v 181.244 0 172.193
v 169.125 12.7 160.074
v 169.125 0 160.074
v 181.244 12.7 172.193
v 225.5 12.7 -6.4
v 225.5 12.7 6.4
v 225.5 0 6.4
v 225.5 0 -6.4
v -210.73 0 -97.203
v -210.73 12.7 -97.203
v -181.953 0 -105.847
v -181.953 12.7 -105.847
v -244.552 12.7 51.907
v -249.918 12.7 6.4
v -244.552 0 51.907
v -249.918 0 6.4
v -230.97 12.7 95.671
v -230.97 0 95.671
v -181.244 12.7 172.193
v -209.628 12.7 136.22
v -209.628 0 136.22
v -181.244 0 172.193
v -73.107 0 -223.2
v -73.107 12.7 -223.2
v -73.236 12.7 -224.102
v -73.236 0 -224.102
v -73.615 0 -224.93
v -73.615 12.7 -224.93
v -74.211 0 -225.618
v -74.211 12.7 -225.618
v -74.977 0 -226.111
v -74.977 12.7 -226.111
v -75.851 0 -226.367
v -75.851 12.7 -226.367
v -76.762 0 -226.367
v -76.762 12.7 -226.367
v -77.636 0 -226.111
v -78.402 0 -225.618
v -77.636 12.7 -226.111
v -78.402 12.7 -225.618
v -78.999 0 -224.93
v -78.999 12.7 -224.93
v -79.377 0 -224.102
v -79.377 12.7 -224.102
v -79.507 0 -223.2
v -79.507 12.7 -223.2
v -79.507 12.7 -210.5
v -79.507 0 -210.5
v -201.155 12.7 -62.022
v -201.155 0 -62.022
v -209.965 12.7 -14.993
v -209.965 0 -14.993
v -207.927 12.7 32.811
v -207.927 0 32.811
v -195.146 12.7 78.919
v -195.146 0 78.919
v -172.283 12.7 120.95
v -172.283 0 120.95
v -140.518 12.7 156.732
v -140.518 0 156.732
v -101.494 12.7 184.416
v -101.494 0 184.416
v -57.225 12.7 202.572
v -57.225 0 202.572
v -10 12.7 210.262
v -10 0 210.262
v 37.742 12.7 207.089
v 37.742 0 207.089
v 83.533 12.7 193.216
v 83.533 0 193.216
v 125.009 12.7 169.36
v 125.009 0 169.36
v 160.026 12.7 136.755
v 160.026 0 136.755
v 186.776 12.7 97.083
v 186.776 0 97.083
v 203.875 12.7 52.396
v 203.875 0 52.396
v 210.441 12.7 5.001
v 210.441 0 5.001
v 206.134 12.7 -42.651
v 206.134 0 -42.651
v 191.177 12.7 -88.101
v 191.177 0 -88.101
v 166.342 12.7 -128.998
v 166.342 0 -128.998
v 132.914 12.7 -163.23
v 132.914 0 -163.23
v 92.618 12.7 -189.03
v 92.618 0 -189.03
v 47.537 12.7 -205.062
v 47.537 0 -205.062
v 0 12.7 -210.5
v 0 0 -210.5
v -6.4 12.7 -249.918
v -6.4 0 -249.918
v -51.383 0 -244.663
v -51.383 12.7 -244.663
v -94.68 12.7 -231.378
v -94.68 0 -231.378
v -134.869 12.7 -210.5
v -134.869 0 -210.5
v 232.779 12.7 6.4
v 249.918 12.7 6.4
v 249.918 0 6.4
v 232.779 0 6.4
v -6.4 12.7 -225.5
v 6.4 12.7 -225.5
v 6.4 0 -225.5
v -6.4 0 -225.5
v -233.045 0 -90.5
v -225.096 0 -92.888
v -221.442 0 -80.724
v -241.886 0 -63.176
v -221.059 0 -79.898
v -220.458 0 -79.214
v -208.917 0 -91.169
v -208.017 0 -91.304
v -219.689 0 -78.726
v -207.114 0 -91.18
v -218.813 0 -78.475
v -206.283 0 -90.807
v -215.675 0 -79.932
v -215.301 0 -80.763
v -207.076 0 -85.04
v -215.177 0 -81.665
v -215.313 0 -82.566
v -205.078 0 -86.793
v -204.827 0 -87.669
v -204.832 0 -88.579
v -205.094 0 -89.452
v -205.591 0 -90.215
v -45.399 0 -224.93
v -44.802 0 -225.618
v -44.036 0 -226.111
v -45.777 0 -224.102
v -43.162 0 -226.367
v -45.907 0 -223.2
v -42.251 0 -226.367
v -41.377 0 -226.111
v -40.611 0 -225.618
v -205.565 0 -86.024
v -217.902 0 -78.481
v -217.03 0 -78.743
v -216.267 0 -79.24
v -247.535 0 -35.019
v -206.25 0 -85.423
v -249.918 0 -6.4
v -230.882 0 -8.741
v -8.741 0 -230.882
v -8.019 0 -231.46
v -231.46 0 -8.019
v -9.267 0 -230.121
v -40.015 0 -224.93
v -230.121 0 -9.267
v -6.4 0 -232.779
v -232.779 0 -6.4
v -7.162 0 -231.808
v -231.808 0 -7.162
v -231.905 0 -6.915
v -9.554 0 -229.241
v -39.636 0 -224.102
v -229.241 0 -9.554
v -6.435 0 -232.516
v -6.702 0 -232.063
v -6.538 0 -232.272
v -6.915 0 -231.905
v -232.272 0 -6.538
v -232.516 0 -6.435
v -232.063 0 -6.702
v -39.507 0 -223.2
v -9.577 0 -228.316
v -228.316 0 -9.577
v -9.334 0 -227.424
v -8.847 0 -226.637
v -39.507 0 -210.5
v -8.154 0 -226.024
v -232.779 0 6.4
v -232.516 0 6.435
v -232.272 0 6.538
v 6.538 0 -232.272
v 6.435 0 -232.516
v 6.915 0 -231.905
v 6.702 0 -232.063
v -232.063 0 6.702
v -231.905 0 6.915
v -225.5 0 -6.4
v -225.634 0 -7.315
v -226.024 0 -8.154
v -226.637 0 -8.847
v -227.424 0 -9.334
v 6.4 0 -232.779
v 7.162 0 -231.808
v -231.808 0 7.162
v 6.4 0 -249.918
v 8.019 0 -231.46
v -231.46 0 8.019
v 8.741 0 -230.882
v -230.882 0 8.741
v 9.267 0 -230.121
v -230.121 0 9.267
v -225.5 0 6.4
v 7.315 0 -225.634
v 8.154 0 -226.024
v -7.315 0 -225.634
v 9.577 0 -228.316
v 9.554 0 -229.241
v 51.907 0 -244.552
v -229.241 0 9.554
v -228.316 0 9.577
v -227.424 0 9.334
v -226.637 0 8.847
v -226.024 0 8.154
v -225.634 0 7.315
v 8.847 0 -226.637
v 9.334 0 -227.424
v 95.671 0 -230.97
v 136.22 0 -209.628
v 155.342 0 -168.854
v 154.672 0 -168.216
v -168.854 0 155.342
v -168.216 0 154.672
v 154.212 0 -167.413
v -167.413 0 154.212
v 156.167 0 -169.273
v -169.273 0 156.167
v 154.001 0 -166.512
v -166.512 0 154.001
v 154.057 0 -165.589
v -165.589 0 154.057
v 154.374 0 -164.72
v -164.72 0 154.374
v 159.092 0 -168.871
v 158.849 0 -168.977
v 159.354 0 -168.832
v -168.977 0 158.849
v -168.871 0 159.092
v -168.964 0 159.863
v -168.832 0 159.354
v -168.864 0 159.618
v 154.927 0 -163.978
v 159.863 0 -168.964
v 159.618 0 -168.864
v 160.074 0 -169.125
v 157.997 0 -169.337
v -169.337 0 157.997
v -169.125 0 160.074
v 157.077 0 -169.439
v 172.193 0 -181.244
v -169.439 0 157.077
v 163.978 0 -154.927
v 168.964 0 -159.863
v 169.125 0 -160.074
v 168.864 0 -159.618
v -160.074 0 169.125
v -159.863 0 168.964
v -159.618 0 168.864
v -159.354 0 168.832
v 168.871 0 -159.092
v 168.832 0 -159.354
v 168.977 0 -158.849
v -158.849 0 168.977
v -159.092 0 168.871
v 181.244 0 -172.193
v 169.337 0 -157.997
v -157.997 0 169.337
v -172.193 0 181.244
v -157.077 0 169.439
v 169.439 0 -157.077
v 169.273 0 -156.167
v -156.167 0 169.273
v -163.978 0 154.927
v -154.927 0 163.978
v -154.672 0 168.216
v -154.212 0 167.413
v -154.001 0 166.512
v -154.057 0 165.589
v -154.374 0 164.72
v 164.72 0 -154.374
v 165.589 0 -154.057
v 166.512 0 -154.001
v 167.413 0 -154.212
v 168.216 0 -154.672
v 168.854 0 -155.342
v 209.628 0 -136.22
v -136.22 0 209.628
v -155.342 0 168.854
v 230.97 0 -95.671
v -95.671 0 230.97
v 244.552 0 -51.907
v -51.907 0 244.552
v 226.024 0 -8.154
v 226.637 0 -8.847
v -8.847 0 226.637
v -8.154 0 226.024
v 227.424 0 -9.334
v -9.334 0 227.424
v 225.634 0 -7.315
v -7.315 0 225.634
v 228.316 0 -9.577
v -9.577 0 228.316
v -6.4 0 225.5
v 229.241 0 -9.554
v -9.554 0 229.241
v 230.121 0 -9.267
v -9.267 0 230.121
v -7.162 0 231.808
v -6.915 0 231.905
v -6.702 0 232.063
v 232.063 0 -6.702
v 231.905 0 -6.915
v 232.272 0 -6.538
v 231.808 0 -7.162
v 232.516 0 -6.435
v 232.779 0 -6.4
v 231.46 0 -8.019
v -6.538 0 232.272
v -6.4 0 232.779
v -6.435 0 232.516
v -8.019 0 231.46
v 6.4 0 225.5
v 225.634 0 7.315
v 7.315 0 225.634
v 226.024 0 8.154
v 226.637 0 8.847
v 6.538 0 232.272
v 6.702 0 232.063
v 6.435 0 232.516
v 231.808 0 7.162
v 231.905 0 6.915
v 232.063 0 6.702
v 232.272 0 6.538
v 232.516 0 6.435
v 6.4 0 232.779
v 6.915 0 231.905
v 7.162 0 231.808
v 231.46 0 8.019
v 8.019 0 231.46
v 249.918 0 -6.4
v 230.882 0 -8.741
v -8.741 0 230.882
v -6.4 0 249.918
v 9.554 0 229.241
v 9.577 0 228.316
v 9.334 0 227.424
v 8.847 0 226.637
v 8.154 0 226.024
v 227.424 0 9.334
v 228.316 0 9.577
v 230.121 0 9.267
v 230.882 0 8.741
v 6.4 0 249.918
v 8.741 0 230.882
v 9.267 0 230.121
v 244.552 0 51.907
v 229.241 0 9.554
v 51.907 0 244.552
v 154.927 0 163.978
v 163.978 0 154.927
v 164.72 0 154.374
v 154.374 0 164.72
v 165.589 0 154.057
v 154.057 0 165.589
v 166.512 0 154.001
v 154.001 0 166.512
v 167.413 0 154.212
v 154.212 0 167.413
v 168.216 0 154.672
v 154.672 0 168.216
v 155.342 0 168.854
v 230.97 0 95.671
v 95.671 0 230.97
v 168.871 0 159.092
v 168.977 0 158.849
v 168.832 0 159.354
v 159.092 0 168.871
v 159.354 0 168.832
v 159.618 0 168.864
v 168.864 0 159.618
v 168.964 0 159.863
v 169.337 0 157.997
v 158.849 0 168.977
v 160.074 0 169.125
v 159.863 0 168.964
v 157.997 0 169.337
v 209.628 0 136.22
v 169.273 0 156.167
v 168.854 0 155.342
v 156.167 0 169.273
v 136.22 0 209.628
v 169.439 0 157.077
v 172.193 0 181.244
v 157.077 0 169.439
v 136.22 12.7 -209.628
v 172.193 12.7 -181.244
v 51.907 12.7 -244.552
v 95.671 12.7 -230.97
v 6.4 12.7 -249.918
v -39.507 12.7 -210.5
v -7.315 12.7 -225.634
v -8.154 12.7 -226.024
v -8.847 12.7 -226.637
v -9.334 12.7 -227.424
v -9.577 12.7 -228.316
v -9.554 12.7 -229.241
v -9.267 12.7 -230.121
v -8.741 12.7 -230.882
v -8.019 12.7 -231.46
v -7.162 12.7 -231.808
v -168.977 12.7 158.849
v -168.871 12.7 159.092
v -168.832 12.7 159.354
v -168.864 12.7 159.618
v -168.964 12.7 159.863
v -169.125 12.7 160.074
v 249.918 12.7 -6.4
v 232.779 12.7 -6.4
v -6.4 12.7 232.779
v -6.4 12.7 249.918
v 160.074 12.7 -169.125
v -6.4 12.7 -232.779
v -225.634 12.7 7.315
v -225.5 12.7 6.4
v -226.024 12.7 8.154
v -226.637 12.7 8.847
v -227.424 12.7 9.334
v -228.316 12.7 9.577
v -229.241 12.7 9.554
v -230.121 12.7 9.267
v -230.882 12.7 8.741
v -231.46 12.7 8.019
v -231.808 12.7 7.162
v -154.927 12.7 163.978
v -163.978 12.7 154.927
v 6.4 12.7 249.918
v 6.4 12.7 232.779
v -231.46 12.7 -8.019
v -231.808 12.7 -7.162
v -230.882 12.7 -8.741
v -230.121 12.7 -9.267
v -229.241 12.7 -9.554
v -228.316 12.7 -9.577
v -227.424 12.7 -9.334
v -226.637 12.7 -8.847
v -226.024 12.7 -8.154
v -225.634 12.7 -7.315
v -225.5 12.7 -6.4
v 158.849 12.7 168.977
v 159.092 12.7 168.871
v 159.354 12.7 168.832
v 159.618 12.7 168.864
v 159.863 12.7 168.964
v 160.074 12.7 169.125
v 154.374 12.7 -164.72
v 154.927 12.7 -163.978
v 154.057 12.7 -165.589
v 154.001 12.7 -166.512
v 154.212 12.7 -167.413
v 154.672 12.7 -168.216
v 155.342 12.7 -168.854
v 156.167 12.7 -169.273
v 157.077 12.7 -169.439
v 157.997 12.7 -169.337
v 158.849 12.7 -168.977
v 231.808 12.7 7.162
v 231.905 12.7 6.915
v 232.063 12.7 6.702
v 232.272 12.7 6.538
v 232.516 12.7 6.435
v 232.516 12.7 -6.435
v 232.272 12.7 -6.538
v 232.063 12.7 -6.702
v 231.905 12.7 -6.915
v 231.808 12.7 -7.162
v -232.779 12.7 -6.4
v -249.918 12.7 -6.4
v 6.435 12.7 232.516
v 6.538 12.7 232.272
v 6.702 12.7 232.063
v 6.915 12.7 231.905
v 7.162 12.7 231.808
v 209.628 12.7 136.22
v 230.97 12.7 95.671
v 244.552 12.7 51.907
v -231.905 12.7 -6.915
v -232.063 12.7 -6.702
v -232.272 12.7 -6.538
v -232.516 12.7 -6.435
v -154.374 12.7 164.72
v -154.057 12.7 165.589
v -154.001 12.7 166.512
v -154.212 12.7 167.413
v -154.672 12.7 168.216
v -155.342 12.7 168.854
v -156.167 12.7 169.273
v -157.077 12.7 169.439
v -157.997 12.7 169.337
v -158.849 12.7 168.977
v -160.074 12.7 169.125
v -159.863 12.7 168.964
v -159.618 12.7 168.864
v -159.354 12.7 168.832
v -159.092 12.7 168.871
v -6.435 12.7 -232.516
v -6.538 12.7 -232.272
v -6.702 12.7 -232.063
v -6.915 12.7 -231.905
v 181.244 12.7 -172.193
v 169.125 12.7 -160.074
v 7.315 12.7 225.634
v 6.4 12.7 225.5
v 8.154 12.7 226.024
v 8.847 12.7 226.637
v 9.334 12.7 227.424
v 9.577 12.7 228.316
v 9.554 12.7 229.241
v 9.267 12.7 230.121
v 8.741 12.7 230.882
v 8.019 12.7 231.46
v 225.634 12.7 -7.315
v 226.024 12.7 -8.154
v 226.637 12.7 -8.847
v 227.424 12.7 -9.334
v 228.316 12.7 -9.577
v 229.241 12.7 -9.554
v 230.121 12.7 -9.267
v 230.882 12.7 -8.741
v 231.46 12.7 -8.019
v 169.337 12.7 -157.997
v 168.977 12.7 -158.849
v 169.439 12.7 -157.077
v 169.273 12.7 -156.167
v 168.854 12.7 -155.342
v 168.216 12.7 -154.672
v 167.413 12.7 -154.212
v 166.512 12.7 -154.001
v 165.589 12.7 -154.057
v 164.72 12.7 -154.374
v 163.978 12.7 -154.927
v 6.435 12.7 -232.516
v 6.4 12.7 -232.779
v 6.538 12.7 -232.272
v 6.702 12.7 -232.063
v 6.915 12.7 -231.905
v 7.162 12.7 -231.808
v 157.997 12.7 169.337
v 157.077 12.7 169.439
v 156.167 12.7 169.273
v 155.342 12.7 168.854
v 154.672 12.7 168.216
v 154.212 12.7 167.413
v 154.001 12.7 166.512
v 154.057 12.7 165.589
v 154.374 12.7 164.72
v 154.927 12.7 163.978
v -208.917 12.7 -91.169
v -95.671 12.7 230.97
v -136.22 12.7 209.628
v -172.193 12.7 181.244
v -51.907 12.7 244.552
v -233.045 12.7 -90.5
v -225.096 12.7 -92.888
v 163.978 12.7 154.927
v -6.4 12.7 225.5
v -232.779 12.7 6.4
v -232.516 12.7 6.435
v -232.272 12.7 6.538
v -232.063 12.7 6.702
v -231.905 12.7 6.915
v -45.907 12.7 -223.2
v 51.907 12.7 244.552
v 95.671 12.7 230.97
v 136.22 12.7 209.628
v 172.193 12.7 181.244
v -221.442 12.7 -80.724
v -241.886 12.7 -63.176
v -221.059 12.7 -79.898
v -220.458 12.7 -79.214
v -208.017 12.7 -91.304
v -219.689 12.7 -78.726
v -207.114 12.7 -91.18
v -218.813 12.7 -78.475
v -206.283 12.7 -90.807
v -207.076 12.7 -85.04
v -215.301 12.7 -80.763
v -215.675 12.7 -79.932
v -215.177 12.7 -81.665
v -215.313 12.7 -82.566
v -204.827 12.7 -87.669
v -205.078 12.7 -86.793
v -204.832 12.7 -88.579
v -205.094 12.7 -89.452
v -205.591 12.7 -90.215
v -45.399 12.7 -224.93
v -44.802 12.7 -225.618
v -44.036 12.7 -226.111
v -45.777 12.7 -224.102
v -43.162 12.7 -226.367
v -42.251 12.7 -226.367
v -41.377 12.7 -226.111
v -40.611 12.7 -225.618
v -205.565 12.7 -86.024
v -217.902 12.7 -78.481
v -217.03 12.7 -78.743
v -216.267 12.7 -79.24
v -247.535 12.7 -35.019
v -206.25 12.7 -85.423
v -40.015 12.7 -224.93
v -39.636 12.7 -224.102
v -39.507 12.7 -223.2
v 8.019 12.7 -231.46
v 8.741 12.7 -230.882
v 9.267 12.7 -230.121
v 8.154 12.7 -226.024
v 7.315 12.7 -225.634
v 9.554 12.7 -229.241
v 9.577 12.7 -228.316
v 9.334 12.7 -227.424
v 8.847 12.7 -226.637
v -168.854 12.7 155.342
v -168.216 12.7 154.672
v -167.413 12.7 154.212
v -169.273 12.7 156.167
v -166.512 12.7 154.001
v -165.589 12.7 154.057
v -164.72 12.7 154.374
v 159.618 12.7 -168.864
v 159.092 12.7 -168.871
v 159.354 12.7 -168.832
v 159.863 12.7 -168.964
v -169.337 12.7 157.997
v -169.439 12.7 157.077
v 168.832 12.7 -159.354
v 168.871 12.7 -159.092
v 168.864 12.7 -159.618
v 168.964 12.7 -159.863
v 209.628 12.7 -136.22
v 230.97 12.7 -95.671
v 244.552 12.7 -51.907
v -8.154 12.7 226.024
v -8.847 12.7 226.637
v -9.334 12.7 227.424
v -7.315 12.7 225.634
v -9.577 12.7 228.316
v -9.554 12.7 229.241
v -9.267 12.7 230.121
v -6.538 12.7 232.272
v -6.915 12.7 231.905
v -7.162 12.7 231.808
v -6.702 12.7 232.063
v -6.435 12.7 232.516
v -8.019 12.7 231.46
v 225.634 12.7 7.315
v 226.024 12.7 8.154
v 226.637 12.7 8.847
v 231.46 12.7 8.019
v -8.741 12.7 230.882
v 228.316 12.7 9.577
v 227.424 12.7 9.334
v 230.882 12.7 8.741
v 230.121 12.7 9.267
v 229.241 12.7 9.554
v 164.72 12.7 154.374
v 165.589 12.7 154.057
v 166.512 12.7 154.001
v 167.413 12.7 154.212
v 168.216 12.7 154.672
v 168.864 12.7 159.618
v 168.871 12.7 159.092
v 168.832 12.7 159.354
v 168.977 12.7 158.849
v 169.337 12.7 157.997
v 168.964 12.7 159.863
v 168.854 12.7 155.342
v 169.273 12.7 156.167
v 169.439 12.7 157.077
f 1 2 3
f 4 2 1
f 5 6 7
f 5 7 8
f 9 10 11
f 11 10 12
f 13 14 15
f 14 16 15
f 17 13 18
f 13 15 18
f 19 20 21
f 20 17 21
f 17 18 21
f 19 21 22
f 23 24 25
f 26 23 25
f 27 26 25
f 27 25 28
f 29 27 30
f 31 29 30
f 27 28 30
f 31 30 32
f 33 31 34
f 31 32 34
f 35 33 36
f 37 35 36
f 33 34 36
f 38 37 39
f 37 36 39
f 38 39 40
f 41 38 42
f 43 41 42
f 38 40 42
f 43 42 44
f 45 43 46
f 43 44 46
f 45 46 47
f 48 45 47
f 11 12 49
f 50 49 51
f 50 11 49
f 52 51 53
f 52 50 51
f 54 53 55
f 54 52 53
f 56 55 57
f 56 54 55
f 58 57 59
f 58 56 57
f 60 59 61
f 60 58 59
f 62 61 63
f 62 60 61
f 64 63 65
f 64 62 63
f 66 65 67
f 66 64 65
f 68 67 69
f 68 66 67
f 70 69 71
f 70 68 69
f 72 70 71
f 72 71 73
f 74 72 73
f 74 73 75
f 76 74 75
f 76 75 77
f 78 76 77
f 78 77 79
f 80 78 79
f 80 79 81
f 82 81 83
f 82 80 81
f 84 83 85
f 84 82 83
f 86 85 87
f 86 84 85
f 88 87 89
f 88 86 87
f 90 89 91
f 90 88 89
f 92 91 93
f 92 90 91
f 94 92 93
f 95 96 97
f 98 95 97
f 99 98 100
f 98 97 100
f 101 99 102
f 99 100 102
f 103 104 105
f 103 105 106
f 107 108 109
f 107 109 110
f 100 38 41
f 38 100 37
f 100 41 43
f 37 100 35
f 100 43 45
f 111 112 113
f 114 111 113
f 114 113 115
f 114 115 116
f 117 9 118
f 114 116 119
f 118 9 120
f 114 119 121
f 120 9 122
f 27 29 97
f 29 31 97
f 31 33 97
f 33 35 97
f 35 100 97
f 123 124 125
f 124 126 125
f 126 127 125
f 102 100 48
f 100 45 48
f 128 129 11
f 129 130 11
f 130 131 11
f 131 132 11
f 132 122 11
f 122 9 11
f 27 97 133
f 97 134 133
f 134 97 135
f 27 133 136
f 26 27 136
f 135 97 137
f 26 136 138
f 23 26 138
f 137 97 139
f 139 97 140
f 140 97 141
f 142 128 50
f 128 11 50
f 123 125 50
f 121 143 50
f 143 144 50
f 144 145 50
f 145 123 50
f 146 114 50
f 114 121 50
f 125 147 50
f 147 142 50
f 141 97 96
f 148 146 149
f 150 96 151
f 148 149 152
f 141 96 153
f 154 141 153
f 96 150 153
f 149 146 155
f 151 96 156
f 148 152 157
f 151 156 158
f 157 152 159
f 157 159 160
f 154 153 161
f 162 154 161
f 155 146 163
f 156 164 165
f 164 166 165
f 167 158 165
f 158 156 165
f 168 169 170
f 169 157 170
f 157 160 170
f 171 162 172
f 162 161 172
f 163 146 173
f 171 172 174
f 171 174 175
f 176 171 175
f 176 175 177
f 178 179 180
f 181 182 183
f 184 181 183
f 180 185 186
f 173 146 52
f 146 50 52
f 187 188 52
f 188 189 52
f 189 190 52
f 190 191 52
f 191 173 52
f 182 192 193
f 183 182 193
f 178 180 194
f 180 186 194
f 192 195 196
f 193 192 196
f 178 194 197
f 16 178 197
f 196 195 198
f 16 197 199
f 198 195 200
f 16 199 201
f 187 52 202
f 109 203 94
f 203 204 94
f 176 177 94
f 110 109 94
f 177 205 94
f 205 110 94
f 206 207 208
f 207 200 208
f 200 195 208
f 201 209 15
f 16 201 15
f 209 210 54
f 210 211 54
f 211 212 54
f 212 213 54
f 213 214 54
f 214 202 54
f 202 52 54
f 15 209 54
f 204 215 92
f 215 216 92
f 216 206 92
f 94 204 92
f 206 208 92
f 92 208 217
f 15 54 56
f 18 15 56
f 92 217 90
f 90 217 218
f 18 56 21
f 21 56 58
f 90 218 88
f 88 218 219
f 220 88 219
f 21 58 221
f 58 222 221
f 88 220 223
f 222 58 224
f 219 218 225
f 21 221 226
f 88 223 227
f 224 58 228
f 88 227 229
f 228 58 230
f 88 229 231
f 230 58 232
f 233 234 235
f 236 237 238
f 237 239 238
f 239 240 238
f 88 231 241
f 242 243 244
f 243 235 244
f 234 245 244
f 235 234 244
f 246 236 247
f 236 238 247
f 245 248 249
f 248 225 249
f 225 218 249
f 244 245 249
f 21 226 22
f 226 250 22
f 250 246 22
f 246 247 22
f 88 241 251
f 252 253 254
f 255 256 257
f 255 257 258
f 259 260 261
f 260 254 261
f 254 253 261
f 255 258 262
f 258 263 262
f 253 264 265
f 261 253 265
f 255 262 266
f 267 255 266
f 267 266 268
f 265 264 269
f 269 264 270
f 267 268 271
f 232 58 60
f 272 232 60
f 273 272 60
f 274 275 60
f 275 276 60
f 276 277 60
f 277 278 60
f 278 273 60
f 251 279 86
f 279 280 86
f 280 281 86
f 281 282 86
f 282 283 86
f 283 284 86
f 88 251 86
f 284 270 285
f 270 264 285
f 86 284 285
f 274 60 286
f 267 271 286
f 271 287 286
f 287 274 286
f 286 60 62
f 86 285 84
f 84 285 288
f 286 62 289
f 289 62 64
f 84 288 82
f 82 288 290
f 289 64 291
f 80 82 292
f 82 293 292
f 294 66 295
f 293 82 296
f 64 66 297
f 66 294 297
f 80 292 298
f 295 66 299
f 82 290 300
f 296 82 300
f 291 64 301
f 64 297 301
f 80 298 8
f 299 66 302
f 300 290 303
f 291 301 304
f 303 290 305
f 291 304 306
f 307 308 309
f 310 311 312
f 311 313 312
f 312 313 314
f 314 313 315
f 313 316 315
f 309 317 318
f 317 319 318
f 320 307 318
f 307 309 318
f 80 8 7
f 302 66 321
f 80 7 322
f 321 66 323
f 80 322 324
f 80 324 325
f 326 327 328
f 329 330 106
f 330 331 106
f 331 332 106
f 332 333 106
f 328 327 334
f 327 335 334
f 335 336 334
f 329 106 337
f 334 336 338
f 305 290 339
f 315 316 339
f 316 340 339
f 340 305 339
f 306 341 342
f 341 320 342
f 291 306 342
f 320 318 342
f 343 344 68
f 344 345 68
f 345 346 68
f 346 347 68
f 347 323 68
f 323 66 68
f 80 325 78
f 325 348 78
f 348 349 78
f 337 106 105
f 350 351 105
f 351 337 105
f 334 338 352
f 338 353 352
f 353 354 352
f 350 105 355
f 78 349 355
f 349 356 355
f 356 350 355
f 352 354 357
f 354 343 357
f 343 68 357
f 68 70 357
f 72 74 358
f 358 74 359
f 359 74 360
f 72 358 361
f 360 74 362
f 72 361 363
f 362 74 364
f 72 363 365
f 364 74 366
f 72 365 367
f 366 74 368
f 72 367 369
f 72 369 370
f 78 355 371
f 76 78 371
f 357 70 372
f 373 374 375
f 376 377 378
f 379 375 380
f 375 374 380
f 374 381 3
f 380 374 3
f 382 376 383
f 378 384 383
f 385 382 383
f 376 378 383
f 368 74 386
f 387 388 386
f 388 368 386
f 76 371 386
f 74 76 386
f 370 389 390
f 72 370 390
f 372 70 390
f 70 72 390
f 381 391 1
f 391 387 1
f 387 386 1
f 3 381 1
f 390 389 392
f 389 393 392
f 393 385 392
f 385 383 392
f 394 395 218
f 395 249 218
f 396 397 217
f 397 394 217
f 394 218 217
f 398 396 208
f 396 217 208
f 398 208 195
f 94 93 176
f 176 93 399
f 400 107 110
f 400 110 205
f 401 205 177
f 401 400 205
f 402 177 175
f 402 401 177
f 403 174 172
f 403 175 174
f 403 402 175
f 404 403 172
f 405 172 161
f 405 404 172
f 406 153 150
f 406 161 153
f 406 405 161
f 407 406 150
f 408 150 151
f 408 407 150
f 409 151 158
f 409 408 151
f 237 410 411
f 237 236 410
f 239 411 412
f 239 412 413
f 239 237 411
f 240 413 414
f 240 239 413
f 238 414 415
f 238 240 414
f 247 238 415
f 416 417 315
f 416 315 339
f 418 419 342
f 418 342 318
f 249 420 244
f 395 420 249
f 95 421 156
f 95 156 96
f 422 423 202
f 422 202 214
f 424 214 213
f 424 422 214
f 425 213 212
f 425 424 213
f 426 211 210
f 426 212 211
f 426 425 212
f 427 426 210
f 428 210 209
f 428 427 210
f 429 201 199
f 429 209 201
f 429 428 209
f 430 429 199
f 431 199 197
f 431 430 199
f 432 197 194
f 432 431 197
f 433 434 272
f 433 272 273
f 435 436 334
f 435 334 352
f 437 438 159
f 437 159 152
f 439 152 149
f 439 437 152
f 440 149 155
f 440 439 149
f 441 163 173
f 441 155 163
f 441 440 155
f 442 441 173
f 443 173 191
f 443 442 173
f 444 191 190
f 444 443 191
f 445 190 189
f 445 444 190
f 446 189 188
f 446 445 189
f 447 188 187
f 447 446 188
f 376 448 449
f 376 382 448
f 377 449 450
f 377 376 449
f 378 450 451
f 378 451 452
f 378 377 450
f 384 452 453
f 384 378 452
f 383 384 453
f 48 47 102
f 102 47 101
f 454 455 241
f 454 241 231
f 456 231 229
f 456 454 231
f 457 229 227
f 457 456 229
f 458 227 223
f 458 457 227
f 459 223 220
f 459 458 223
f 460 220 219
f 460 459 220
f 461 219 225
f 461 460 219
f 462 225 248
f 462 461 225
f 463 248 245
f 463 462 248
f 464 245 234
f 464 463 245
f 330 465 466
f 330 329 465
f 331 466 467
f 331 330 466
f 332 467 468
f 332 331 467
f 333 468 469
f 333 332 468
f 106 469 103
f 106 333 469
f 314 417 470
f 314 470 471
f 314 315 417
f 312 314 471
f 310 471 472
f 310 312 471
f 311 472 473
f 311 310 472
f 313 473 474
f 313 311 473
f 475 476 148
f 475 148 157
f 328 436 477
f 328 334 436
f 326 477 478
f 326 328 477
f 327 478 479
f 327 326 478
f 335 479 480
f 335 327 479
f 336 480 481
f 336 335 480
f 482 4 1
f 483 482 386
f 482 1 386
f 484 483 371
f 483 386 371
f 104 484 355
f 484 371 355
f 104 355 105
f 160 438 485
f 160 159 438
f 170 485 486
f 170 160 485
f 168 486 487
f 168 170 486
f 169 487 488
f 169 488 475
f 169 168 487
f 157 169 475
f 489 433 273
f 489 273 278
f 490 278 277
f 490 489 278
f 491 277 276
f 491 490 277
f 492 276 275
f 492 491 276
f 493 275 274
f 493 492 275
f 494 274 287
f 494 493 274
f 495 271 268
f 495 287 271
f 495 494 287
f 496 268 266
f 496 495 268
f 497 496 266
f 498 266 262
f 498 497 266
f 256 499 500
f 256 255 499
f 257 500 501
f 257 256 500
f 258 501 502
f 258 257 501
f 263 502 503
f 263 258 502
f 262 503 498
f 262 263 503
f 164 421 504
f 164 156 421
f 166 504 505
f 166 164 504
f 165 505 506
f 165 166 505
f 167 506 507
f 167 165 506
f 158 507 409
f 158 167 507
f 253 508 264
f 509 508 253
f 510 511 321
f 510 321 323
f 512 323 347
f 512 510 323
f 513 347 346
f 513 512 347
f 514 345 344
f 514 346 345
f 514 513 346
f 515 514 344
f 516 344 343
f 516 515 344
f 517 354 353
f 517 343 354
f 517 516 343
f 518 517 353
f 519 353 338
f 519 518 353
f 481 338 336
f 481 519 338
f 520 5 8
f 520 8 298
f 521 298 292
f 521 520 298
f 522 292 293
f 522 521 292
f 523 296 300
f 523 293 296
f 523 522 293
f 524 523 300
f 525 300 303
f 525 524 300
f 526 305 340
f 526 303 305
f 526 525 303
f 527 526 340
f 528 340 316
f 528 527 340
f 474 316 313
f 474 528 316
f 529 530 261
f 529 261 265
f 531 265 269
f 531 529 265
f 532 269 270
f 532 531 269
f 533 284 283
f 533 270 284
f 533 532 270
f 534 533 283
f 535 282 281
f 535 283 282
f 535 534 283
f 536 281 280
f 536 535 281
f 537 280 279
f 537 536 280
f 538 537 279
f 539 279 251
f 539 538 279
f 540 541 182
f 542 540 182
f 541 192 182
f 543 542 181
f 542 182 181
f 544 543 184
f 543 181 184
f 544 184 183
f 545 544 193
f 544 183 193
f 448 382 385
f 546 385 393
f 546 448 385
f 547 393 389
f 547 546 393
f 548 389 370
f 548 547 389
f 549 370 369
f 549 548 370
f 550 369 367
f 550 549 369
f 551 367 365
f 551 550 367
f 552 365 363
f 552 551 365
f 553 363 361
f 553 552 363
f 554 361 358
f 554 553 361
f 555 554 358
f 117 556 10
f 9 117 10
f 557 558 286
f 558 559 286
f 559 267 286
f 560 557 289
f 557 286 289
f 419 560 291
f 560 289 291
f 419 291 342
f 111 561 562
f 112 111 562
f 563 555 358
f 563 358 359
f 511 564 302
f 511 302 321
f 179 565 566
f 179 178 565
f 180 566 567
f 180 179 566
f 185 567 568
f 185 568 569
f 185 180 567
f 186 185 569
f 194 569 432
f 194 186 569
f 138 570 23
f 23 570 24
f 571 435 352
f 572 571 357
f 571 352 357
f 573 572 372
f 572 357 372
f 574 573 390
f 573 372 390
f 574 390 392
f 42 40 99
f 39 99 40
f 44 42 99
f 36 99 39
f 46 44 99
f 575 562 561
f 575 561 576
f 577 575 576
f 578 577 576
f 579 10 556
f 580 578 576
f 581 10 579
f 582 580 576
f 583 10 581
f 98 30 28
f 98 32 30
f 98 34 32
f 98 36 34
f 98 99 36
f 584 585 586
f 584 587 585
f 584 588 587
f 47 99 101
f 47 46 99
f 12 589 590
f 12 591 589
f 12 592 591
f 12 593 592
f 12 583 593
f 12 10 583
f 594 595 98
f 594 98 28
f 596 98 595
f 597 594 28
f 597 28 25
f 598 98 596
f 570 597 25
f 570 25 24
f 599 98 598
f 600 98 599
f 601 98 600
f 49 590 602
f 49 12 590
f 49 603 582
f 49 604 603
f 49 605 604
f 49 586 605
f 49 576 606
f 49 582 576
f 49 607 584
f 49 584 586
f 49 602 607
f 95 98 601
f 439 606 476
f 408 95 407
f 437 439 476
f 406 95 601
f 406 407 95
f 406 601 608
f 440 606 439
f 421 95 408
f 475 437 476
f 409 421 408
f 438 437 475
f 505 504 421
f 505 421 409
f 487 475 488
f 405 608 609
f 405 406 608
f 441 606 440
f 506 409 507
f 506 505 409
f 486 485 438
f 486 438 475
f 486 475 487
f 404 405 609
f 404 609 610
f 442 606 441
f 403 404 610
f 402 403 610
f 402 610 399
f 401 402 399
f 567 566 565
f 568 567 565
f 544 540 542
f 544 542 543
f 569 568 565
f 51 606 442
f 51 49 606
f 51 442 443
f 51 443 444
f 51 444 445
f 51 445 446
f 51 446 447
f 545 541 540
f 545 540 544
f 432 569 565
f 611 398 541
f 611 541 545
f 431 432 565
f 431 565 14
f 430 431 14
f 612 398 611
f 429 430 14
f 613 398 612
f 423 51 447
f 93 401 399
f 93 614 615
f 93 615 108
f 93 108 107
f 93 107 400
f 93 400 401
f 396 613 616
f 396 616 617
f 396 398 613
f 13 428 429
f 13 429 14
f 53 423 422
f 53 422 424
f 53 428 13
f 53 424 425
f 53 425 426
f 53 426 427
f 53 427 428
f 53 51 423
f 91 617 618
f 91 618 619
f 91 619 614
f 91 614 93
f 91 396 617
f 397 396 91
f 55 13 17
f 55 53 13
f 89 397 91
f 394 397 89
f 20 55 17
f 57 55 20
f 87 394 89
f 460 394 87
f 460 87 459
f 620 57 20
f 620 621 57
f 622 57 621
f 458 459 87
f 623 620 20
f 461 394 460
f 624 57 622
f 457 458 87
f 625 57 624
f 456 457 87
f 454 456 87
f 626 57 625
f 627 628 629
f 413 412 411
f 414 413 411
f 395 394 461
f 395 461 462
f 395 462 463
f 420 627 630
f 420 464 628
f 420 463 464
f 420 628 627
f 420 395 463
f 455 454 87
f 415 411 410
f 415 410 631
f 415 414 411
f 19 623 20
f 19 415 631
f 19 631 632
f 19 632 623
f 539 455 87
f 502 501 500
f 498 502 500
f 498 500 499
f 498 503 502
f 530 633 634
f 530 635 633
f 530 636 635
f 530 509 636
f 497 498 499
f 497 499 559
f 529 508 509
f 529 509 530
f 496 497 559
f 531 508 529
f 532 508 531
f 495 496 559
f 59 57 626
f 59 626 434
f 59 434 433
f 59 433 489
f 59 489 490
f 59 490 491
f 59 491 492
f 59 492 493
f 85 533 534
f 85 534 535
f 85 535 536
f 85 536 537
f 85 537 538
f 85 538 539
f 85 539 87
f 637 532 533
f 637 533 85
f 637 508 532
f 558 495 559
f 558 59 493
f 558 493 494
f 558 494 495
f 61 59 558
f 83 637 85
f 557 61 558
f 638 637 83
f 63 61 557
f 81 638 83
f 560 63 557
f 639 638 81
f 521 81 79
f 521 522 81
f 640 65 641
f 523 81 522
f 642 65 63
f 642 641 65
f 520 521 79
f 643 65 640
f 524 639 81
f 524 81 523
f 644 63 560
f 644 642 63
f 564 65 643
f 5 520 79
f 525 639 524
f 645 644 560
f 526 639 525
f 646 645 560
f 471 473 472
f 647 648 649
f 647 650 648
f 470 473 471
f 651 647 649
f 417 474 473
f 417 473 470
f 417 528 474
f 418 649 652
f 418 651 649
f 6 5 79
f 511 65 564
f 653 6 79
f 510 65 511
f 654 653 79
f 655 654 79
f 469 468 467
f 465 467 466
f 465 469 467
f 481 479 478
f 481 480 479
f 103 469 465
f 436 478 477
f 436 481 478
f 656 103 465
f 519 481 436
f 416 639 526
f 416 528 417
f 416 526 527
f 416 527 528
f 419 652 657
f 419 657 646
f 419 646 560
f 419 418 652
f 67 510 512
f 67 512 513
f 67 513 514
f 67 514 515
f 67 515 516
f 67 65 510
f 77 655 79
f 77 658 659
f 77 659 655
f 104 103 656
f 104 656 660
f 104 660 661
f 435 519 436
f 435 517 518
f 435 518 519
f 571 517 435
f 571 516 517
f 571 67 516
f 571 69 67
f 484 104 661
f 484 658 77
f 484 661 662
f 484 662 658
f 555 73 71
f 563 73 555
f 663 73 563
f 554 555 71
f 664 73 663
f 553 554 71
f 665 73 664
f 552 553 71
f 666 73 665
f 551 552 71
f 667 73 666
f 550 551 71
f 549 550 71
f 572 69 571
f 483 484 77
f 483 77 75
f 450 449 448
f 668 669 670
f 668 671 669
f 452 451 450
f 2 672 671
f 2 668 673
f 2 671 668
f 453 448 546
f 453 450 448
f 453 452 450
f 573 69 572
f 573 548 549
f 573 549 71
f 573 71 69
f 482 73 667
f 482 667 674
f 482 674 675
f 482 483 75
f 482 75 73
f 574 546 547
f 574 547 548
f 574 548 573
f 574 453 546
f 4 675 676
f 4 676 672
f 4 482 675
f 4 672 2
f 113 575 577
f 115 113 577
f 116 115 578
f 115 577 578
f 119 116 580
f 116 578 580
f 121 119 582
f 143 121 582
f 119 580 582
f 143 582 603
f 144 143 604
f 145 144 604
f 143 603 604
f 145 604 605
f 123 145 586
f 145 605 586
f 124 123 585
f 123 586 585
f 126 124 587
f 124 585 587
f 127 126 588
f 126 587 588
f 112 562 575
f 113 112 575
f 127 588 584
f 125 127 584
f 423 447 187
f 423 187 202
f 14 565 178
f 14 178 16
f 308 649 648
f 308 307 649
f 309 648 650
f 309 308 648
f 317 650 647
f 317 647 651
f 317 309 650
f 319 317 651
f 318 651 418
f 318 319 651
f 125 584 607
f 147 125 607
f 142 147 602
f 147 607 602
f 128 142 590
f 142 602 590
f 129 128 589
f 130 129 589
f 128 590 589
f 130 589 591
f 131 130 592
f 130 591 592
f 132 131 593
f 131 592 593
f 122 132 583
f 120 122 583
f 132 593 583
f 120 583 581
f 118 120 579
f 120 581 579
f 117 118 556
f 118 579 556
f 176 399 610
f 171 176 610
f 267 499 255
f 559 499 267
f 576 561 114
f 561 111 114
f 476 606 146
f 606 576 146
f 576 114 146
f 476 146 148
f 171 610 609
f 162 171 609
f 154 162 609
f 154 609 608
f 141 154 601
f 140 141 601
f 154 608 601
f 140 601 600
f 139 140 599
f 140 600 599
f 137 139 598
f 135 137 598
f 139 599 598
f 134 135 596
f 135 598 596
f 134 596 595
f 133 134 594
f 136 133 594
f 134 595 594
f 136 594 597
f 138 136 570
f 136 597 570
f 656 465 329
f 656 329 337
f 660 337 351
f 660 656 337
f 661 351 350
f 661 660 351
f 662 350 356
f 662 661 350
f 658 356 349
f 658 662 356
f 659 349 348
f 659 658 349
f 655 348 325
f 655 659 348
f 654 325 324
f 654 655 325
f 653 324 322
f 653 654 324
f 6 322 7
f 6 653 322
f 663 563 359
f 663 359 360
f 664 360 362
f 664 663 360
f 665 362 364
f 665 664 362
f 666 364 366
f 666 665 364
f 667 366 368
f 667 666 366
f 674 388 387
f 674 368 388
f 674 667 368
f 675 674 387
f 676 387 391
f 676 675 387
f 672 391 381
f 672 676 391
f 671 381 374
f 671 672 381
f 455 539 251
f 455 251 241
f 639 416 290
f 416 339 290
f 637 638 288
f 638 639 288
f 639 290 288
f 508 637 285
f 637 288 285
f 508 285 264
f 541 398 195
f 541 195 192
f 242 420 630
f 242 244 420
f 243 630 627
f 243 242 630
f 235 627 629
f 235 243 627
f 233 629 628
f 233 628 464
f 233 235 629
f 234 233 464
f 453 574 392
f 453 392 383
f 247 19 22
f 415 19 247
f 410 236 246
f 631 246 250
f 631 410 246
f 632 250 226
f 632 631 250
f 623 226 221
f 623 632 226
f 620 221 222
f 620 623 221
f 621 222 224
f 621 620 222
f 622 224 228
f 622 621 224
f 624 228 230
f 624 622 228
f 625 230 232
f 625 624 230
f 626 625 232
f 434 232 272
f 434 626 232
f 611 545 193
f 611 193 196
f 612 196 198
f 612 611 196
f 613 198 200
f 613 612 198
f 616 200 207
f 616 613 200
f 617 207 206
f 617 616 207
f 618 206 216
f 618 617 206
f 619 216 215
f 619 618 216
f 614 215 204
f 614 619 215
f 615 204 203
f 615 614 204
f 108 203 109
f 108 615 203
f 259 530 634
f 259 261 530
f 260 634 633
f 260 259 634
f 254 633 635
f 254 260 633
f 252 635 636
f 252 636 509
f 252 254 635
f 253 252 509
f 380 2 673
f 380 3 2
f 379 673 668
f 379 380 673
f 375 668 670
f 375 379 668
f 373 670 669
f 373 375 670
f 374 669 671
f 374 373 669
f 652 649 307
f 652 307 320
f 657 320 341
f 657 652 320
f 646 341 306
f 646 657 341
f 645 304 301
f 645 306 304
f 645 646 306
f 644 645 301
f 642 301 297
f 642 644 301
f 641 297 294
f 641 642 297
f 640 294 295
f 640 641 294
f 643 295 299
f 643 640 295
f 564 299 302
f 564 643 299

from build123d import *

# Parameters (mm, degrees)
SKETCH1_R                = 250
SKETCH1_R_2              = 210.5
BOSS_EXTRUDE1_DEPTH      = 12.7
CUT_EXTRUDE1_DEPTH       = 354.781415566
FILLET1_R                = 1
CIRPATTERN1_COUNT        = 8
FILLET1_OF_CIRPATTERN1_R = 1
CUT_EXTRUDE3_DEPTH       = 354.665618911
CUT_EXTRUDE4_DEPTH       = 354.665618911


with BuildPart() as part:
    # Sketch1 → Boss-Extrude1 (new body)
    with BuildSketch(Plane(origin=(0, 0, 0), x_dir=(1, 0, 0), z_dir=(0, 1, 0))):
        with Locations(Location((0, 0, 0), (0, 0, 270))):
            Circle(SKETCH1_R)
        with Locations(Location((0, 0, 0), (0, 0, 270))):
            Circle(SKETCH1_R_2, mode=Mode.SUBTRACT)
    extrude(amount=BOSS_EXTRUDE1_DEPTH)

    # Sketch2 → Cut-Extrude1 (cut, through all)
    with BuildSketch(Plane(origin=(0, 12.7, 0), x_dir=(1, 0, 0), z_dir=(0, 1, 0))):
        with BuildLine():
            Line((6.4, 225.5), (-6.4, 225.5))
            ThreePointArc((-6.4, 225.5), (-9.6, 228.7), (-6.4, 231.9))
            Line((-6.4, 231.9), (-6.4, 250))
            Line((-6.4, 250), (6.4, 250))
            Line((6.4, 250), (6.4, 231.9))
            ThreePointArc((6.4, 231.9), (9.6, 228.7), (6.4, 225.5))
        make_face()
    cut_extrude1 = extrude(amount=-CUT_EXTRUDE1_DEPTH, mode=Mode.SUBTRACT)

    # Fillet1
    fillet1_edges = [part.edges().sort_by_distance(p)[0] for p in [
        (-6.4, 6.35, -231.9),
        (6.4, 6.35, -231.9),
    ]]
    fillet(fillet1_edges, radius=FILLET1_R)

    # CirPattern1: Cut-Extrude1 ×8 about axis
    cirpattern1_axis = Axis((0, 0, 0), (0, 1, 0))
    for i in range(1, CIRPATTERN1_COUNT):
        add(cut_extrude1.rotate(cirpattern1_axis, i * 360 / CIRPATTERN1_COUNT), mode=Mode.SUBTRACT)

    # Fillet1 of CirPattern1
    fillet1_of_cirpattern1_edges = [part.edges().sort_by_distance(p)[0] for p in [
        (-168.503545957, 6.35, -159.452579158),
        (-159.452579158, 6.35, -168.503545957),
        (-231.9, 6.35, 6.4),
        (-231.9, 6.35, -6.4),
        (-159.452579158, 6.35, 168.503545957),
        (-168.503545957, 6.35, 159.452579158),
        (6.4, 6.35, 231.9),
        (-6.4, 6.35, 231.9),
        (168.503545957, 6.35, 159.452579158),
        (159.452579158, 6.35, 168.503545957),
        (231.9, 6.35, -6.4),
        (231.9, 6.35, 6.4),
        (159.452579158, 6.35, -168.503545957),
        (168.503545957, 6.35, -159.452579158),
    ]]
    fillet(fillet1_of_cirpattern1_edges, radius=FILLET1_OF_CIRPATTERN1_R)

    # Sketch5 → Cut-Extrude3 (cut, through all)
    with BuildSketch(Plane(origin=(0, 12.7, 0), x_dir=(1, 0, 0), z_dir=(0, 1, 0))):
        Polygon((0, 210.5), (-248.044523643, 210.5), (-248.044523643, 90.5), (-233.044523643, 90.5), (0, 160.5), align=None)
    extrude(amount=-CUT_EXTRUDE3_DEPTH, mode=Mode.SUBTRACT)

    # Sketch6 → Cut-Extrude4 (cut, through all)
    with BuildSketch(Plane(origin=(0, 12.7, 0), x_dir=(1, 0, 0), z_dir=(0, 1, 0))):
        with BuildLine():
            Line((-39.506660352, 210.5), (-39.506660352, 223.2))
            ThreePointArc((-39.506660352, 223.2), (-42.706660352, 226.4), (-45.906660352, 223.2))
            Line((-45.906660352, 223.2), (-73.106660352, 223.2))
            ThreePointArc((-73.106660352, 223.2), (-76.306660352, 226.4), (-79.506660352, 223.2))
            Line((-79.506660352, 223.2), (-79.506660352, 210.5))
            Line((-79.506660352, 210.5), (-39.506660352, 210.5))
        make_face()
        with BuildLine():
            Line((-225.095552296, 92.887646728), (-221.442085646, 80.724498227))
            ThreePointArc((-221.442085646, 80.724498227), (-217.45679679, 78.580326423), (-215.312624985, 82.565615279))
            Line((-215.312624985, 82.565615279), (-207.076162221, 85.039616318))
            ThreePointArc((-207.076162221, 85.039616318), (-204.931990416, 89.024905174), (-208.917279273, 91.169076979))
            Line((-208.917279273, 91.169076979), (-210.72962887, 97.202764818))
            Line((-210.72962887, 97.202764818), (-225.095552296, 92.887646728))
        make_face()
    extrude(amount=-CUT_EXTRUDE4_DEPTH, mode=Mode.SUBTRACT)


solid = part.part
